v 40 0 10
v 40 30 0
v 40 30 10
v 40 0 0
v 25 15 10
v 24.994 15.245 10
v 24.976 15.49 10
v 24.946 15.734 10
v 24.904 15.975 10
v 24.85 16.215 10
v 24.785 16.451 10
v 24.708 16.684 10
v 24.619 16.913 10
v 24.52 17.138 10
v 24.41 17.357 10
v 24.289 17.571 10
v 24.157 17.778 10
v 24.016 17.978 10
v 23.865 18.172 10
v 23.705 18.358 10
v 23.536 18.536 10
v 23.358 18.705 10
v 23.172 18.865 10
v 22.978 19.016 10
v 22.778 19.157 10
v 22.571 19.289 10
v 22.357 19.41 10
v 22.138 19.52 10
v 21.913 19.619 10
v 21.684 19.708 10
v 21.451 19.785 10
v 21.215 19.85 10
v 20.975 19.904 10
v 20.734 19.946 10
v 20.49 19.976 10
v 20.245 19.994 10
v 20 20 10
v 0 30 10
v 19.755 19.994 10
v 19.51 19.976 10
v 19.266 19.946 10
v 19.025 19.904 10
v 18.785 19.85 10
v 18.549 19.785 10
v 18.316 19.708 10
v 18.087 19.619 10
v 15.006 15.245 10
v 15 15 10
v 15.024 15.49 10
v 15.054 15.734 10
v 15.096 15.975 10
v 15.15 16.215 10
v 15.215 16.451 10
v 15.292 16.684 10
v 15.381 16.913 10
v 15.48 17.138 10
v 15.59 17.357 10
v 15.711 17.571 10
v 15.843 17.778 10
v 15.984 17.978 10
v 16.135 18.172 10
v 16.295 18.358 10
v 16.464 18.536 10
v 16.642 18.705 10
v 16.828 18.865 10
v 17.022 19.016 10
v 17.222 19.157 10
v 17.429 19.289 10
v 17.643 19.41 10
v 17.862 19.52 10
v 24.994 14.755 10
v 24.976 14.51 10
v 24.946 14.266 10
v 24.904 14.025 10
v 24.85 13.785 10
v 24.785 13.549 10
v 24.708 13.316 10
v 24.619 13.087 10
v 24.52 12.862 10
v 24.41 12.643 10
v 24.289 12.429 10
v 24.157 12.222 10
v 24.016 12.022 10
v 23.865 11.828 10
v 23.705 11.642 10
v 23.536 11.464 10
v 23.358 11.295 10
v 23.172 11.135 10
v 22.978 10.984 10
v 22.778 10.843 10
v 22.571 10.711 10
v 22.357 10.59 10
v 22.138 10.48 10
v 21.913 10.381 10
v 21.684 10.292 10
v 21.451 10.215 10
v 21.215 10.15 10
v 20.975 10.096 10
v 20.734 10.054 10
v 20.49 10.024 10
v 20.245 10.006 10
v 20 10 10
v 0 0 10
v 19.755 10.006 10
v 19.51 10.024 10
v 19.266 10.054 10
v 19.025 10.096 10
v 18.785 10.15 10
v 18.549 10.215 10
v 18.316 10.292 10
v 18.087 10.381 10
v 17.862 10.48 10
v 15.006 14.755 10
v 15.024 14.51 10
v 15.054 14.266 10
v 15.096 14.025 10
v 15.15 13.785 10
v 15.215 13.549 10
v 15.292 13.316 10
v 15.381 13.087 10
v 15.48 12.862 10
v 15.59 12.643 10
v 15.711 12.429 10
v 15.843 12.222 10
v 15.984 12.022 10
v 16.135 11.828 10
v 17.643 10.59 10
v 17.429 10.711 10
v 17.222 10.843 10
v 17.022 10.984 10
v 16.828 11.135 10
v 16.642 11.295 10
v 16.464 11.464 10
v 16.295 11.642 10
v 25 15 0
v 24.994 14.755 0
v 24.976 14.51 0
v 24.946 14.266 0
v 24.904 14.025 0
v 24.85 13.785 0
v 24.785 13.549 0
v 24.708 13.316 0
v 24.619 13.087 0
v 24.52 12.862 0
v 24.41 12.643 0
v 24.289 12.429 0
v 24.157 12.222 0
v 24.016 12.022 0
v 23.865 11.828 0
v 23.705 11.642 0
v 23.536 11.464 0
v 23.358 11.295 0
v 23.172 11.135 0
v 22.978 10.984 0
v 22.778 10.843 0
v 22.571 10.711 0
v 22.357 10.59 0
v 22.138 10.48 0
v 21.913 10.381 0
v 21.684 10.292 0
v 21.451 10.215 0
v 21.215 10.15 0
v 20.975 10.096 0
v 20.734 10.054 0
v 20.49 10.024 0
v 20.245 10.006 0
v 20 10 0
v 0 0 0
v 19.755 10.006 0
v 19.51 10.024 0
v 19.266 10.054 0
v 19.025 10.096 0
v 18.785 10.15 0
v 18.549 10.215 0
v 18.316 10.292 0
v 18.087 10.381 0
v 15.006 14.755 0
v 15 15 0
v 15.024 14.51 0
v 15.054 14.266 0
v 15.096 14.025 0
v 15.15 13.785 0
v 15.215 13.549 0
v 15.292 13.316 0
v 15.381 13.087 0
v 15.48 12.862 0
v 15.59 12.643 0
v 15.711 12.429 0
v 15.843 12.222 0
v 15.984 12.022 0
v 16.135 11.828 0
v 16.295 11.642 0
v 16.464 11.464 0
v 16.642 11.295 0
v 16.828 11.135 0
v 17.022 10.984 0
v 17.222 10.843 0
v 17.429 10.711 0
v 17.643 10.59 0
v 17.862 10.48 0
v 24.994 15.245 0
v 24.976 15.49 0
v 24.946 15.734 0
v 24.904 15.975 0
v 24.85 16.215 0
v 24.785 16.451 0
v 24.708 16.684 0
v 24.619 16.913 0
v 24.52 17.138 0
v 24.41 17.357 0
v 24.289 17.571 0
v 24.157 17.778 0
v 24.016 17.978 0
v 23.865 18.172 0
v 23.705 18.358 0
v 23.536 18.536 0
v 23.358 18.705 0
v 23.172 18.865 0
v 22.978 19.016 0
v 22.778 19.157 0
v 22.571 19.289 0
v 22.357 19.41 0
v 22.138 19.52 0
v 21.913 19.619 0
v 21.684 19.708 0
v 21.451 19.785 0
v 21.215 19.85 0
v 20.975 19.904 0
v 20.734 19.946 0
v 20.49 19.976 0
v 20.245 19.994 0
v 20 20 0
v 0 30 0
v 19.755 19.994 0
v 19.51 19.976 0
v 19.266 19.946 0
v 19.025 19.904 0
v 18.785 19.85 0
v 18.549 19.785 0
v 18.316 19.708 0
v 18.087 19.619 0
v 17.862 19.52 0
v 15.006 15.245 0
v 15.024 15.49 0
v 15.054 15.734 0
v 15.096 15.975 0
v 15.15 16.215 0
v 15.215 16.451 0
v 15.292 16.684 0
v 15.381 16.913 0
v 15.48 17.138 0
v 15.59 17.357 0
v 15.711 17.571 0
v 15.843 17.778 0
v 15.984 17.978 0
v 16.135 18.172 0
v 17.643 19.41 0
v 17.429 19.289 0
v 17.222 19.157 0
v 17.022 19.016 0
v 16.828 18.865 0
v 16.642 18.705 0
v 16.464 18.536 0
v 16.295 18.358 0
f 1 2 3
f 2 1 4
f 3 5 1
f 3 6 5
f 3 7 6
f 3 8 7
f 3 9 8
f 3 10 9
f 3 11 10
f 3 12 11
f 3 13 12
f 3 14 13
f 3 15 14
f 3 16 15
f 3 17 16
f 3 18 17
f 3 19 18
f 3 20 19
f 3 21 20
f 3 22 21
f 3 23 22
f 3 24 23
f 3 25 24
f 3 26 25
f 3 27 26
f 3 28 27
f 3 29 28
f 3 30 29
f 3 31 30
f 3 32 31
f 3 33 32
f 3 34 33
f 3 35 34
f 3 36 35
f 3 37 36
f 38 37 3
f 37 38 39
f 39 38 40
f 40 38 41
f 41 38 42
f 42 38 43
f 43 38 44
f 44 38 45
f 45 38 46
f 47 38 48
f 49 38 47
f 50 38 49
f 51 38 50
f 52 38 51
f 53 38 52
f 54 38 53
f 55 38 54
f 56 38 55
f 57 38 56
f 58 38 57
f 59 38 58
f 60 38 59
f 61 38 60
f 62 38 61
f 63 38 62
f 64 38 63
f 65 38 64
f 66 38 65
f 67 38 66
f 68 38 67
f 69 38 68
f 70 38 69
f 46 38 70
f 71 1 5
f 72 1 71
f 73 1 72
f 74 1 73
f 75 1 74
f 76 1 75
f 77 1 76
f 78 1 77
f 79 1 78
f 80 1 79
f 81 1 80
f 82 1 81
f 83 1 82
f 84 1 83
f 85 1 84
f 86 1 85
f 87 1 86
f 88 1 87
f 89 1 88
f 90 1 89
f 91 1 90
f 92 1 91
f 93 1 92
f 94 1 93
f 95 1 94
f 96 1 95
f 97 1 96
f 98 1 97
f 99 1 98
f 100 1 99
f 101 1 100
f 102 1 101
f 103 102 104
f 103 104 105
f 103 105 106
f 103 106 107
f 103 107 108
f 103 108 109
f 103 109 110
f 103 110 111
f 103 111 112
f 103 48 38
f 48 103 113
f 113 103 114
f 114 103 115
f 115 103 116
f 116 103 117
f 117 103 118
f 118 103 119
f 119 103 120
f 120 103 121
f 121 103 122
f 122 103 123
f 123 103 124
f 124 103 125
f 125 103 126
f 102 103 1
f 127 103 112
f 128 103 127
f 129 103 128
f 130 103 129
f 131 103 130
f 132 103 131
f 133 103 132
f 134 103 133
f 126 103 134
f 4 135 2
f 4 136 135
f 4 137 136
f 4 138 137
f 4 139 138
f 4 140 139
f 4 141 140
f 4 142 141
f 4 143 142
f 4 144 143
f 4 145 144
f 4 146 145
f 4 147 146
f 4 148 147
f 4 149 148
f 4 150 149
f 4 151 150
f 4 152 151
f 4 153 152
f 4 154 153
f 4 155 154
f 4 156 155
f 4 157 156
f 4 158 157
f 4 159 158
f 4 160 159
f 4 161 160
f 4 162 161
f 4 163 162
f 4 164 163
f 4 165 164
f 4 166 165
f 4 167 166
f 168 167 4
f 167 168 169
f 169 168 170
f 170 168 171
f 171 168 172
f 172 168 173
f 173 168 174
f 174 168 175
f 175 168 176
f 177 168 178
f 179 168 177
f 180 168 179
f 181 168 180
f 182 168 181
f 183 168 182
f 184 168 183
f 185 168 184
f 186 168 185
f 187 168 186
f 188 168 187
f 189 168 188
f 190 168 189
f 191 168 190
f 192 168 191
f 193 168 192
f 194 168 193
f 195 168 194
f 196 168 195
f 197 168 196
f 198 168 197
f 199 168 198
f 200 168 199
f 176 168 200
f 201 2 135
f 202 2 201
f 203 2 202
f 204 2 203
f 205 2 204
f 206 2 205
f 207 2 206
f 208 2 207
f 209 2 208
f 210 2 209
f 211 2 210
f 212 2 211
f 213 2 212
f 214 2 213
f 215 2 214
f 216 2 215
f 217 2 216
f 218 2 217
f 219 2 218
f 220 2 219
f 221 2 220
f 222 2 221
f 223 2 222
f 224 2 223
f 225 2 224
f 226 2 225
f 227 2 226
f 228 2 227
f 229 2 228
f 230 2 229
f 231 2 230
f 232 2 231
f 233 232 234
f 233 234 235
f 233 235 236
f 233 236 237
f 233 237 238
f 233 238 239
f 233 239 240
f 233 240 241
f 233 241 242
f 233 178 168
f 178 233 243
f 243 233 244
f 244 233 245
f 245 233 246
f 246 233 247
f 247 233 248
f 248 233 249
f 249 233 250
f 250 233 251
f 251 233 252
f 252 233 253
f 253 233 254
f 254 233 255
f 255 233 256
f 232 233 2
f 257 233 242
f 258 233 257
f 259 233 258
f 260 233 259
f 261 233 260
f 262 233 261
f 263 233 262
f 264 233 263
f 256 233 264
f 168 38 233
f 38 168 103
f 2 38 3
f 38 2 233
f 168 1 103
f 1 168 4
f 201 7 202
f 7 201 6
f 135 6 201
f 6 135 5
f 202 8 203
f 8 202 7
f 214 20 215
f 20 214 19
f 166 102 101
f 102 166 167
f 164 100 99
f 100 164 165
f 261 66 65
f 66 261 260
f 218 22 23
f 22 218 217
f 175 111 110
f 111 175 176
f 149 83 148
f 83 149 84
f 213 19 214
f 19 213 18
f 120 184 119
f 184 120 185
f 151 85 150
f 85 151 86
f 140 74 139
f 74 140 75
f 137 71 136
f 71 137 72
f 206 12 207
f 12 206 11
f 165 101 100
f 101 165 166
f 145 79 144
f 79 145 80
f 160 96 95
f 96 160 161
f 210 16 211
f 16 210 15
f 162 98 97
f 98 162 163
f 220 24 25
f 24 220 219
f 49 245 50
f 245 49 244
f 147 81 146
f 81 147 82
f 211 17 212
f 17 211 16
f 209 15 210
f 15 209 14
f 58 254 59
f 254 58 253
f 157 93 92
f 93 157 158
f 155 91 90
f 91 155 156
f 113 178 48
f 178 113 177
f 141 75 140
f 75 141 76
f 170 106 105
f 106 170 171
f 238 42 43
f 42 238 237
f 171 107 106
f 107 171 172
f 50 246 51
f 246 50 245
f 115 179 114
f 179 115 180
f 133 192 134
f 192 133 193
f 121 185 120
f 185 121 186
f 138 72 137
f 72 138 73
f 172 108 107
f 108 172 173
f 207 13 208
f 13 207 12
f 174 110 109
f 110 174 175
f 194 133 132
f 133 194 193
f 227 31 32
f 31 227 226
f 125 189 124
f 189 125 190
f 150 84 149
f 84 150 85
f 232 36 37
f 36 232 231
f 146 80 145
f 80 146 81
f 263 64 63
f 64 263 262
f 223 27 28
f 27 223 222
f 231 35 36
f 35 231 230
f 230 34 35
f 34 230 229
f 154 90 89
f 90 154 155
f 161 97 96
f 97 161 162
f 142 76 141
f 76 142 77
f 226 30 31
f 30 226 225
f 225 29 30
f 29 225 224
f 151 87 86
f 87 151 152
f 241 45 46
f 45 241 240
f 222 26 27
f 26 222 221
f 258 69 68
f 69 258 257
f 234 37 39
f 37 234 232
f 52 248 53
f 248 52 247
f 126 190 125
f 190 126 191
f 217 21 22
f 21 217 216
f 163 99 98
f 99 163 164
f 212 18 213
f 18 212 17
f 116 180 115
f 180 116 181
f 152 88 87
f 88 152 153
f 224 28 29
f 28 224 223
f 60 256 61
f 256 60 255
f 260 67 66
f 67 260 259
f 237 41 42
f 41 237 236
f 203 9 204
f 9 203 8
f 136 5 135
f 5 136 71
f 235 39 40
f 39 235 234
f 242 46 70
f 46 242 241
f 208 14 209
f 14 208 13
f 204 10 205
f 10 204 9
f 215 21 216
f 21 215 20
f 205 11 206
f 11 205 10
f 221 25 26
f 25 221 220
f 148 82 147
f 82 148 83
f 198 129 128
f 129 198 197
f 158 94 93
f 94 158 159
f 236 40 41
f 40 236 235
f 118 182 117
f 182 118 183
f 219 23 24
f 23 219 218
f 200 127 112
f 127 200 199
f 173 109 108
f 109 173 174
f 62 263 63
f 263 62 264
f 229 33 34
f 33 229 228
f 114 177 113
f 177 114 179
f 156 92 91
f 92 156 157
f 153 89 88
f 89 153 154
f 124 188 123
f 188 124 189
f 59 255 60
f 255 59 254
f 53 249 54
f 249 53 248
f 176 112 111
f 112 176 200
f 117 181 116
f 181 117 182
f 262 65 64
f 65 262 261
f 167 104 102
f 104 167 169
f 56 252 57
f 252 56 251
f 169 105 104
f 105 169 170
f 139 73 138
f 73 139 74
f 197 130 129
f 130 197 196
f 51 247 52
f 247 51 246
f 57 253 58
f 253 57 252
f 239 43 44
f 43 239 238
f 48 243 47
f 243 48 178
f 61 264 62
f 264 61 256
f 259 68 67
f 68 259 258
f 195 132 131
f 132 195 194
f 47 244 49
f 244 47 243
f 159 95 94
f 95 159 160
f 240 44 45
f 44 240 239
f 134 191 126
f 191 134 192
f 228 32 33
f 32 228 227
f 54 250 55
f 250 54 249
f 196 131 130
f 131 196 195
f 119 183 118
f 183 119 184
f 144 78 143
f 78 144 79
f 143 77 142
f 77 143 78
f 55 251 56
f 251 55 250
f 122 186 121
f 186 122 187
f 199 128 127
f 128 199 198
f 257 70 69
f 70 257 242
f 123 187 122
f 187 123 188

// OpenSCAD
// Parametric block with a through-hole. Override with -D width=50 etc.
width = 40;
depth = 30;
height = 10;
holeRadius = 5;
mode = "solid"; // "solid" or "projection" (2D footprint for SVG)
$fn = 128;

module block() {
  difference() {
    cube([width, depth, height]);
    translate([width / 2, depth / 2, -1]) cylinder(r = holeRadius, h = height + 2);
  }
}

if (mode == "projection") projection() block(); else block();
